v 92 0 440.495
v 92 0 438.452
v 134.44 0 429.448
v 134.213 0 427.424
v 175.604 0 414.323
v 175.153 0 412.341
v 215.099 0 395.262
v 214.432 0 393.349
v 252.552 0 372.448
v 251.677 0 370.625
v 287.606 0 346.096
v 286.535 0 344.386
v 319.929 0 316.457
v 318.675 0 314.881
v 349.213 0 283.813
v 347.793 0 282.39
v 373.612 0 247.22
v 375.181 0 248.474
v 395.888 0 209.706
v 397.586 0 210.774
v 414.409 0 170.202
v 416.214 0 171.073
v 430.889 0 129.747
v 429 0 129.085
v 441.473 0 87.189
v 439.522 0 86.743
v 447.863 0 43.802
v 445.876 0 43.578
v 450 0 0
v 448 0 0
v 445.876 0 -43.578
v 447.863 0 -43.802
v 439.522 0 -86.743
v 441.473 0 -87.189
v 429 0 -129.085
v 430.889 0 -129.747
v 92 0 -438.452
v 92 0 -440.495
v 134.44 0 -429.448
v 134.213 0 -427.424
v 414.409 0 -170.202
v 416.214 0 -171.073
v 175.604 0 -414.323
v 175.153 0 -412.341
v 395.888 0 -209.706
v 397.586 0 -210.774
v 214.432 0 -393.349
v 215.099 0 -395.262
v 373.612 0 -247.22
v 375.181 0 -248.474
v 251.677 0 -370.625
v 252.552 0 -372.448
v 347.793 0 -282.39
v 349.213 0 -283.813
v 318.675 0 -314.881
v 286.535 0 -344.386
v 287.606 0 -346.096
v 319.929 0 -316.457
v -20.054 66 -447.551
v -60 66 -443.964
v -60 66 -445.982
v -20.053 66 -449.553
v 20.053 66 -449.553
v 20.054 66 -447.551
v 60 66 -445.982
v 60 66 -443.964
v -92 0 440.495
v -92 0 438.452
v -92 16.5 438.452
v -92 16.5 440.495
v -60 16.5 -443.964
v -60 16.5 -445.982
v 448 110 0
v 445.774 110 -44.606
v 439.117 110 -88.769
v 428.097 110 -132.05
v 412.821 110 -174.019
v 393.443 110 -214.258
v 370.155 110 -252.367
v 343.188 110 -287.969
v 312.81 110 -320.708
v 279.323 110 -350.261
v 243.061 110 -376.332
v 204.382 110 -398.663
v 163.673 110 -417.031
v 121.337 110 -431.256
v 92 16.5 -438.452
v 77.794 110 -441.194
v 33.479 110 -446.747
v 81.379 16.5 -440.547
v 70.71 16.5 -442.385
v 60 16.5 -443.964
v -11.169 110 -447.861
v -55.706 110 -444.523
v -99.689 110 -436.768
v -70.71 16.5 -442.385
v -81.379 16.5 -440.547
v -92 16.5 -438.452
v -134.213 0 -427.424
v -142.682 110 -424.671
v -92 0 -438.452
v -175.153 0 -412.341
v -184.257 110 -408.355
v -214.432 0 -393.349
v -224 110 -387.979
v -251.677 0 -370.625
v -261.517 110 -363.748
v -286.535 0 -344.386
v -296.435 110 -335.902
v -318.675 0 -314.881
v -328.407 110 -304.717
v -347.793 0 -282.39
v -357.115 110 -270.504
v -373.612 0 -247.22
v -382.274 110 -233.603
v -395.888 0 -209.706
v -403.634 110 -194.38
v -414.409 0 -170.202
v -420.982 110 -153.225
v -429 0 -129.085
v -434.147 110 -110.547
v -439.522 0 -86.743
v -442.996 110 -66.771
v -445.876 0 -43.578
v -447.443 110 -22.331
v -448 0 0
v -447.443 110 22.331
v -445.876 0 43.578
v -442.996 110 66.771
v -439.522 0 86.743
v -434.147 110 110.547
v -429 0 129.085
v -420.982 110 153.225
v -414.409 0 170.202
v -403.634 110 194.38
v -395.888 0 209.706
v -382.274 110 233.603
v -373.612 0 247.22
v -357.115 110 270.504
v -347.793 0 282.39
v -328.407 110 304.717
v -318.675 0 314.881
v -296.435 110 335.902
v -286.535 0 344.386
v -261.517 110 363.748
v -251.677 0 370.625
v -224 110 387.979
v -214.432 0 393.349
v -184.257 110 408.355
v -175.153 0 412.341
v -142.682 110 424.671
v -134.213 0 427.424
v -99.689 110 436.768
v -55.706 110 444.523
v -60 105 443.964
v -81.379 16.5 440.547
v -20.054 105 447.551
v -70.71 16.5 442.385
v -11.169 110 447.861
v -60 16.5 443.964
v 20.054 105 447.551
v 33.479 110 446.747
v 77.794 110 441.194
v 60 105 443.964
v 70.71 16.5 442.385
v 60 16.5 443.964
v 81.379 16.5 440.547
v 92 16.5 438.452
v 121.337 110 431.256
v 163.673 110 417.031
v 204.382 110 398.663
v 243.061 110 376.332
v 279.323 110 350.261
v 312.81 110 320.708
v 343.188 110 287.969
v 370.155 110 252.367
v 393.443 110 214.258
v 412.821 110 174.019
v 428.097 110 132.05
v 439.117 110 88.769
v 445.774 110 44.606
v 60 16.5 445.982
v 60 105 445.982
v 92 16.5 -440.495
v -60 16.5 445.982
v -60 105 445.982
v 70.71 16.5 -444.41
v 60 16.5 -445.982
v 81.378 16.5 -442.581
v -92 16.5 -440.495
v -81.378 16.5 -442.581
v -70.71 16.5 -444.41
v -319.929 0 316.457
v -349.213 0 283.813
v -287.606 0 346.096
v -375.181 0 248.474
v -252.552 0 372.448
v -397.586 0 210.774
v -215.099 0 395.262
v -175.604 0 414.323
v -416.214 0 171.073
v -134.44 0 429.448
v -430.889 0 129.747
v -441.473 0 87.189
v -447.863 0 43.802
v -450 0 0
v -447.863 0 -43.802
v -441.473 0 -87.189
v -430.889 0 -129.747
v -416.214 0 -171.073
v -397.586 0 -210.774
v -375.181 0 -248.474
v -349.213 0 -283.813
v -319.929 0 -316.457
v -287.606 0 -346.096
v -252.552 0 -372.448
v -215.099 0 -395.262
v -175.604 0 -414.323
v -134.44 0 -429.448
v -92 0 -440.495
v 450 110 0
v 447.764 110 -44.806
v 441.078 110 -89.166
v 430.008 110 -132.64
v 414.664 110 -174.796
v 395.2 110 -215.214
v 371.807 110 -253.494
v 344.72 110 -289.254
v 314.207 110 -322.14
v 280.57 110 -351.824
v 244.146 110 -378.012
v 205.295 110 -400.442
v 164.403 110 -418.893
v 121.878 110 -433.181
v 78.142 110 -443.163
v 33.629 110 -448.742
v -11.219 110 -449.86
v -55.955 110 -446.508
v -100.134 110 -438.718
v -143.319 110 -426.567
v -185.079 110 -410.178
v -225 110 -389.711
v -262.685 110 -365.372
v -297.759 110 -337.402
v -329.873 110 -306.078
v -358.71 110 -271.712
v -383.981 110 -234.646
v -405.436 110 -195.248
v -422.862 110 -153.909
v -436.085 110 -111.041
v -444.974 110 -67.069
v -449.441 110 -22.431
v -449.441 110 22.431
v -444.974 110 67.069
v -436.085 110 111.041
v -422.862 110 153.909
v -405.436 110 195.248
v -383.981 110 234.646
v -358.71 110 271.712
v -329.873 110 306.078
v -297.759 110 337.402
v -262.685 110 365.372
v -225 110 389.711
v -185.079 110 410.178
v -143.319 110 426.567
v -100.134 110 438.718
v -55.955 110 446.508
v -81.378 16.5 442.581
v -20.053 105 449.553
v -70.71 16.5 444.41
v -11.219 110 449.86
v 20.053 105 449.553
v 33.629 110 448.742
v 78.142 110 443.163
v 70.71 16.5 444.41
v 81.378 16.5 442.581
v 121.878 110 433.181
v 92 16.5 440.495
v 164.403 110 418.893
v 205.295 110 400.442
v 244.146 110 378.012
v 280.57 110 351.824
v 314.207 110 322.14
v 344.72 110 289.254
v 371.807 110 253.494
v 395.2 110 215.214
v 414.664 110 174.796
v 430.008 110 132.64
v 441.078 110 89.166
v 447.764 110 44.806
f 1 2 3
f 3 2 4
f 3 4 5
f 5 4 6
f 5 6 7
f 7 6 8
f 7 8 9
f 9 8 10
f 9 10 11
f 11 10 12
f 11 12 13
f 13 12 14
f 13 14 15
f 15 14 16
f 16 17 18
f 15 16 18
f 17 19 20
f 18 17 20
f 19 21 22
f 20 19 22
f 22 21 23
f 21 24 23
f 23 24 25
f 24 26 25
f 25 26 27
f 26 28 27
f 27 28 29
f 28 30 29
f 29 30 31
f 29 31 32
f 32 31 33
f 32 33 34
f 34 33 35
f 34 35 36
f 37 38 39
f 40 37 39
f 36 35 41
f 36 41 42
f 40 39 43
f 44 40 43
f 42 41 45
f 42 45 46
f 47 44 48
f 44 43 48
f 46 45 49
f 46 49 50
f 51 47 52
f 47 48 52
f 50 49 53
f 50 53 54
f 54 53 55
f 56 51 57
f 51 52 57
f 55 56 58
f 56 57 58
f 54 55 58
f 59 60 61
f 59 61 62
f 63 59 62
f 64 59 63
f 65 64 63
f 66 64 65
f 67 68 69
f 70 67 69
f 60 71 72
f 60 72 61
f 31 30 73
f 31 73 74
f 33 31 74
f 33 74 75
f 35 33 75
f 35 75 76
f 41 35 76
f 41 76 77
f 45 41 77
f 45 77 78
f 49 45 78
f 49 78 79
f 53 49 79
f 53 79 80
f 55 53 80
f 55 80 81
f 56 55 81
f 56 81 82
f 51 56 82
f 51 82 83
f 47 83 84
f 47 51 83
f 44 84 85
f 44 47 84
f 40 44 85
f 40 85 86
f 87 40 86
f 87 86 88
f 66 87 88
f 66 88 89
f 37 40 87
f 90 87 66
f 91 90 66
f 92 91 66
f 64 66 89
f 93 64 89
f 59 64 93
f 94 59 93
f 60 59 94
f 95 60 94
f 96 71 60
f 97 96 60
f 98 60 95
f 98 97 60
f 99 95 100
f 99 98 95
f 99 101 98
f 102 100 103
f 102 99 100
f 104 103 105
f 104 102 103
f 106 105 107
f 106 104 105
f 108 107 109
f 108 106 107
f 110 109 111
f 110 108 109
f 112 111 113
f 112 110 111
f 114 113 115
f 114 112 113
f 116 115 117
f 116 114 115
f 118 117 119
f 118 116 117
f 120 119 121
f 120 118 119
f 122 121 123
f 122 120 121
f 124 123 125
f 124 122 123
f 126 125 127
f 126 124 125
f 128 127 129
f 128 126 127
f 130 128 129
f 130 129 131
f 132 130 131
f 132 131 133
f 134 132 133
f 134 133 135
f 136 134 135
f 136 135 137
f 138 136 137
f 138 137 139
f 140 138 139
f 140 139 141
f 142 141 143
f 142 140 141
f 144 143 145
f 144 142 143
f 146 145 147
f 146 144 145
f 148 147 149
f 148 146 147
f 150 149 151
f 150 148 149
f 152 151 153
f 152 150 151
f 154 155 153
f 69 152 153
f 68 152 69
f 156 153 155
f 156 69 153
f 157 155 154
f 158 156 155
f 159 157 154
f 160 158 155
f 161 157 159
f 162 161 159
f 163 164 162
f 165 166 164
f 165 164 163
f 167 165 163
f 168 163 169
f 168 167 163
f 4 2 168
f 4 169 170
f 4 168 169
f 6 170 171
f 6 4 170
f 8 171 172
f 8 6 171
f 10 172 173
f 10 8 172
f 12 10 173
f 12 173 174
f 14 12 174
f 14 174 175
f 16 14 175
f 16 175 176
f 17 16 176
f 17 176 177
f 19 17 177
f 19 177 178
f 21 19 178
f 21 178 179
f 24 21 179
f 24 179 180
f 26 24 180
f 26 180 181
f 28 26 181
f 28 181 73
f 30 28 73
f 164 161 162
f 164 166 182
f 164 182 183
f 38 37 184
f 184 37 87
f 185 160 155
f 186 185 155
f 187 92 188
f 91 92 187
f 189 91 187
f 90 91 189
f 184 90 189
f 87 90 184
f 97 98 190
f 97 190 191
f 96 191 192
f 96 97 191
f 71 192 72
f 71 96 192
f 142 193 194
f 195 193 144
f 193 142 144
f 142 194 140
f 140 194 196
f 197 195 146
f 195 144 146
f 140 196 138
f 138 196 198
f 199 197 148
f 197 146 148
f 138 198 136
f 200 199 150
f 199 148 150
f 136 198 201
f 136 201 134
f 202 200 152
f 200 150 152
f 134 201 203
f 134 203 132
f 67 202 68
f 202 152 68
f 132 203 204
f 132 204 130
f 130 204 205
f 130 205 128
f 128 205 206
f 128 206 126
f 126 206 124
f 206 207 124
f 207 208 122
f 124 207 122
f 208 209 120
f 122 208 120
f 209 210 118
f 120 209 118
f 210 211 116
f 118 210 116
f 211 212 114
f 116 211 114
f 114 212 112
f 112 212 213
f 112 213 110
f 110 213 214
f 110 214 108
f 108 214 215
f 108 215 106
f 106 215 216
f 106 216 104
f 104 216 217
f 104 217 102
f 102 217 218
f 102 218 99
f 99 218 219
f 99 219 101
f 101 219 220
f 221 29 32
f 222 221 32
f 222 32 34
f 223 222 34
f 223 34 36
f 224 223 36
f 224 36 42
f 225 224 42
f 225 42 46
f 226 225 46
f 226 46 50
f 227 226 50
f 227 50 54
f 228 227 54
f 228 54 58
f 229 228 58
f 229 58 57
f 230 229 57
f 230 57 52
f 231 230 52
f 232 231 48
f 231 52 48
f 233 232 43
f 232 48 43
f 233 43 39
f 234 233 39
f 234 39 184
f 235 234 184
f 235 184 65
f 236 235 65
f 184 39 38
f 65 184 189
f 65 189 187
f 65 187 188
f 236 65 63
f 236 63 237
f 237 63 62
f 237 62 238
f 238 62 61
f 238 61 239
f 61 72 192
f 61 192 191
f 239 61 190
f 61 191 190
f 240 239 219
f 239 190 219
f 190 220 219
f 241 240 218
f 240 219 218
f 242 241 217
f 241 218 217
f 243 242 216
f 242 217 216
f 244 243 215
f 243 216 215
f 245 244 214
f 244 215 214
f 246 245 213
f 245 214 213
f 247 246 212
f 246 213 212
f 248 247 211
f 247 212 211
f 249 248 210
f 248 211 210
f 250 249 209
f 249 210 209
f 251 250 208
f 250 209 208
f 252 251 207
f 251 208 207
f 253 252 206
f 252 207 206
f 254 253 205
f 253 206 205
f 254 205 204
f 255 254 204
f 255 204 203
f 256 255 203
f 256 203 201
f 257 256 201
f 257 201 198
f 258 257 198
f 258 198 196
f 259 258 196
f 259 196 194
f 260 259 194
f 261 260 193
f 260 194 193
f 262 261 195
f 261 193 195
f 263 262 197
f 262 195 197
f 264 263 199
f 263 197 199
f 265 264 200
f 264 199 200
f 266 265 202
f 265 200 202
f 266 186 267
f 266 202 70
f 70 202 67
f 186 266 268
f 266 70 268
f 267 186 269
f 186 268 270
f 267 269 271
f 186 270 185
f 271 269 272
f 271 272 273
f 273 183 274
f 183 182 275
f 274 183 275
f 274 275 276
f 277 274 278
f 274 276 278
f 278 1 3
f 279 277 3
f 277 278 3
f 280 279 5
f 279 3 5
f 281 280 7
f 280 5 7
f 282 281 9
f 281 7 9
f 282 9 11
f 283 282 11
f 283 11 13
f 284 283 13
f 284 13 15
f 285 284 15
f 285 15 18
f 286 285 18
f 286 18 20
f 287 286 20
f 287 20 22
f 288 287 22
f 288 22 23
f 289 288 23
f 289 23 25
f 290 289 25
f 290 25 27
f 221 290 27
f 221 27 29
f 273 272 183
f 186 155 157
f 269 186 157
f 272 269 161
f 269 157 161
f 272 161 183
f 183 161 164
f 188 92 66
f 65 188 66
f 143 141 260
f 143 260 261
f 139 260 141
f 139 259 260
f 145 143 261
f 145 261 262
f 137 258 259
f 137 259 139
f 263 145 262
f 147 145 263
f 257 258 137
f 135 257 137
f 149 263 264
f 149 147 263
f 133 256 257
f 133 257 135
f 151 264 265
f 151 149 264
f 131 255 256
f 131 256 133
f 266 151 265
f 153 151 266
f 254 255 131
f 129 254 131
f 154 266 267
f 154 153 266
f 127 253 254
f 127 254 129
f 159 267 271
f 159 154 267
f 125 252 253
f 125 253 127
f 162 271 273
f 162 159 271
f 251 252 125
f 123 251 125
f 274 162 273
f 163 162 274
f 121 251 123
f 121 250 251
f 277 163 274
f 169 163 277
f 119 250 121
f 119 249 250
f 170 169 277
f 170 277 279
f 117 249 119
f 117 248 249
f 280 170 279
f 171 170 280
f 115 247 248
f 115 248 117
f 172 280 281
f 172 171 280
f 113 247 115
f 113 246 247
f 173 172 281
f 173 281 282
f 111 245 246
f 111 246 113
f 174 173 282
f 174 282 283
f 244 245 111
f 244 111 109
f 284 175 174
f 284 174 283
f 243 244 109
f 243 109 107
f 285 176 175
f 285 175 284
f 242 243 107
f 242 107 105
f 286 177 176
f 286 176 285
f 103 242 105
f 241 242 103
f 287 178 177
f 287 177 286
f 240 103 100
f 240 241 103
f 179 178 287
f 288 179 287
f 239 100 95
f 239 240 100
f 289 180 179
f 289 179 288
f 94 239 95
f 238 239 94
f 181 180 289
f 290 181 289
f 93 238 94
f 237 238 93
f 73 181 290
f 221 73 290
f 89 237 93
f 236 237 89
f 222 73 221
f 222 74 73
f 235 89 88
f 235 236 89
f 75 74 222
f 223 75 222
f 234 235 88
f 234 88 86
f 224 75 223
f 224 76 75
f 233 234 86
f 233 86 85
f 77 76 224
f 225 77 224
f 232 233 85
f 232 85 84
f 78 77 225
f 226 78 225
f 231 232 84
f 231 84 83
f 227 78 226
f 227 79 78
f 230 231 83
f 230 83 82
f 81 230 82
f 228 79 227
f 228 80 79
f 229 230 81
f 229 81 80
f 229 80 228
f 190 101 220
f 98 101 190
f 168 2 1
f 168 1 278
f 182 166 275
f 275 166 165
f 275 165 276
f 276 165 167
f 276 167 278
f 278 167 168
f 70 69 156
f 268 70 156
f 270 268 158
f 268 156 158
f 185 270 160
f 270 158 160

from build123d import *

# Parameters (mm, degrees)
CROQUIS1_R              = 450
CROQUIS1_R_2            = 448
SALIENTE_EXTRUIR2_DEPTH = 110
CROQUIS2_W              = 120
CROQUIS2_H              = 210
CROQUIS2_W_2            = 32
CROQUIS2_H_2            = 16.5
CORTAR_EXTRUIR2_DEPTH   = 500
CROQUIS3_W              = 120
CROQUIS3_H              = 66
CROQUIS3_W_2            = 32
CROQUIS3_H_2            = 16.5
CORTAR_EXTRUIR3_DEPTH   = 500


with BuildPart() as part:
    # Croquis1 → Saliente-Extruir2 (new body)
    with BuildSketch(Plane(origin=(0, 0, 0), x_dir=(1, 0, 0), z_dir=(0, 1, 0))):
        Circle(CROQUIS1_R)
        Circle(CROQUIS1_R_2, mode=Mode.SUBTRACT)
    extrude(amount=SALIENTE_EXTRUIR2_DEPTH)

    # Croquis2 → Cortar-Extruir2 (cut)
    with BuildSketch(Plane.XY):
        Rectangle(CROQUIS2_W, CROQUIS2_H)
        with Locations((-76, 8.25)):
            Rectangle(CROQUIS2_W_2, CROQUIS2_H_2)
        with Locations((76, 8.25)):
            Rectangle(CROQUIS2_W_2, CROQUIS2_H_2)
    extrude(amount=CORTAR_EXTRUIR2_DEPTH, mode=Mode.SUBTRACT)

    # Croquis3 → Cortar-Extruir3 (cut)
    with BuildSketch(Plane.XY):
        with Locations((0, 33)):
            Rectangle(CROQUIS3_W, CROQUIS3_H)
        with Locations((76, 8.25)):
            Rectangle(CROQUIS3_W_2, CROQUIS3_H_2)
        with Locations((-76, 8.25)):
            Rectangle(CROQUIS3_W_2, CROQUIS3_H_2)
    extrude(amount=-CORTAR_EXTRUIR3_DEPTH, mode=Mode.SUBTRACT)


solid = part.part
